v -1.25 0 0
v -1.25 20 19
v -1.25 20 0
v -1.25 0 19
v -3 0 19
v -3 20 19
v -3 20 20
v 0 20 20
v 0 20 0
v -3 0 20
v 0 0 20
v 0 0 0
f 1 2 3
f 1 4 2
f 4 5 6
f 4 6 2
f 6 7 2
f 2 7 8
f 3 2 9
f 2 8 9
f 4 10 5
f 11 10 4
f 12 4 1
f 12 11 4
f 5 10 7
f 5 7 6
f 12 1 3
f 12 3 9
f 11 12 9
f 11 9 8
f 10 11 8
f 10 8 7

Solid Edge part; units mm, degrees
sketch "Sketch1" plane through (0, 0, 0) normal (0, -1, 0) x (1, 0, 0)
  line L0 (0, 0) -> (0, 20)
  line L1 (0, 20) -> (-3, 20)
  line L2 (-3, 20) -> (-3, 19)
  line L3 (-3, 19) -> (-1.25, 19)
  line L4 (-1.25, 19) -> (-1.25, 0)
  line L5 (-1.25, 0) -> (0, 0)
extrude "Protrusion1" add sketch "Sketch1" against normal blind 20
